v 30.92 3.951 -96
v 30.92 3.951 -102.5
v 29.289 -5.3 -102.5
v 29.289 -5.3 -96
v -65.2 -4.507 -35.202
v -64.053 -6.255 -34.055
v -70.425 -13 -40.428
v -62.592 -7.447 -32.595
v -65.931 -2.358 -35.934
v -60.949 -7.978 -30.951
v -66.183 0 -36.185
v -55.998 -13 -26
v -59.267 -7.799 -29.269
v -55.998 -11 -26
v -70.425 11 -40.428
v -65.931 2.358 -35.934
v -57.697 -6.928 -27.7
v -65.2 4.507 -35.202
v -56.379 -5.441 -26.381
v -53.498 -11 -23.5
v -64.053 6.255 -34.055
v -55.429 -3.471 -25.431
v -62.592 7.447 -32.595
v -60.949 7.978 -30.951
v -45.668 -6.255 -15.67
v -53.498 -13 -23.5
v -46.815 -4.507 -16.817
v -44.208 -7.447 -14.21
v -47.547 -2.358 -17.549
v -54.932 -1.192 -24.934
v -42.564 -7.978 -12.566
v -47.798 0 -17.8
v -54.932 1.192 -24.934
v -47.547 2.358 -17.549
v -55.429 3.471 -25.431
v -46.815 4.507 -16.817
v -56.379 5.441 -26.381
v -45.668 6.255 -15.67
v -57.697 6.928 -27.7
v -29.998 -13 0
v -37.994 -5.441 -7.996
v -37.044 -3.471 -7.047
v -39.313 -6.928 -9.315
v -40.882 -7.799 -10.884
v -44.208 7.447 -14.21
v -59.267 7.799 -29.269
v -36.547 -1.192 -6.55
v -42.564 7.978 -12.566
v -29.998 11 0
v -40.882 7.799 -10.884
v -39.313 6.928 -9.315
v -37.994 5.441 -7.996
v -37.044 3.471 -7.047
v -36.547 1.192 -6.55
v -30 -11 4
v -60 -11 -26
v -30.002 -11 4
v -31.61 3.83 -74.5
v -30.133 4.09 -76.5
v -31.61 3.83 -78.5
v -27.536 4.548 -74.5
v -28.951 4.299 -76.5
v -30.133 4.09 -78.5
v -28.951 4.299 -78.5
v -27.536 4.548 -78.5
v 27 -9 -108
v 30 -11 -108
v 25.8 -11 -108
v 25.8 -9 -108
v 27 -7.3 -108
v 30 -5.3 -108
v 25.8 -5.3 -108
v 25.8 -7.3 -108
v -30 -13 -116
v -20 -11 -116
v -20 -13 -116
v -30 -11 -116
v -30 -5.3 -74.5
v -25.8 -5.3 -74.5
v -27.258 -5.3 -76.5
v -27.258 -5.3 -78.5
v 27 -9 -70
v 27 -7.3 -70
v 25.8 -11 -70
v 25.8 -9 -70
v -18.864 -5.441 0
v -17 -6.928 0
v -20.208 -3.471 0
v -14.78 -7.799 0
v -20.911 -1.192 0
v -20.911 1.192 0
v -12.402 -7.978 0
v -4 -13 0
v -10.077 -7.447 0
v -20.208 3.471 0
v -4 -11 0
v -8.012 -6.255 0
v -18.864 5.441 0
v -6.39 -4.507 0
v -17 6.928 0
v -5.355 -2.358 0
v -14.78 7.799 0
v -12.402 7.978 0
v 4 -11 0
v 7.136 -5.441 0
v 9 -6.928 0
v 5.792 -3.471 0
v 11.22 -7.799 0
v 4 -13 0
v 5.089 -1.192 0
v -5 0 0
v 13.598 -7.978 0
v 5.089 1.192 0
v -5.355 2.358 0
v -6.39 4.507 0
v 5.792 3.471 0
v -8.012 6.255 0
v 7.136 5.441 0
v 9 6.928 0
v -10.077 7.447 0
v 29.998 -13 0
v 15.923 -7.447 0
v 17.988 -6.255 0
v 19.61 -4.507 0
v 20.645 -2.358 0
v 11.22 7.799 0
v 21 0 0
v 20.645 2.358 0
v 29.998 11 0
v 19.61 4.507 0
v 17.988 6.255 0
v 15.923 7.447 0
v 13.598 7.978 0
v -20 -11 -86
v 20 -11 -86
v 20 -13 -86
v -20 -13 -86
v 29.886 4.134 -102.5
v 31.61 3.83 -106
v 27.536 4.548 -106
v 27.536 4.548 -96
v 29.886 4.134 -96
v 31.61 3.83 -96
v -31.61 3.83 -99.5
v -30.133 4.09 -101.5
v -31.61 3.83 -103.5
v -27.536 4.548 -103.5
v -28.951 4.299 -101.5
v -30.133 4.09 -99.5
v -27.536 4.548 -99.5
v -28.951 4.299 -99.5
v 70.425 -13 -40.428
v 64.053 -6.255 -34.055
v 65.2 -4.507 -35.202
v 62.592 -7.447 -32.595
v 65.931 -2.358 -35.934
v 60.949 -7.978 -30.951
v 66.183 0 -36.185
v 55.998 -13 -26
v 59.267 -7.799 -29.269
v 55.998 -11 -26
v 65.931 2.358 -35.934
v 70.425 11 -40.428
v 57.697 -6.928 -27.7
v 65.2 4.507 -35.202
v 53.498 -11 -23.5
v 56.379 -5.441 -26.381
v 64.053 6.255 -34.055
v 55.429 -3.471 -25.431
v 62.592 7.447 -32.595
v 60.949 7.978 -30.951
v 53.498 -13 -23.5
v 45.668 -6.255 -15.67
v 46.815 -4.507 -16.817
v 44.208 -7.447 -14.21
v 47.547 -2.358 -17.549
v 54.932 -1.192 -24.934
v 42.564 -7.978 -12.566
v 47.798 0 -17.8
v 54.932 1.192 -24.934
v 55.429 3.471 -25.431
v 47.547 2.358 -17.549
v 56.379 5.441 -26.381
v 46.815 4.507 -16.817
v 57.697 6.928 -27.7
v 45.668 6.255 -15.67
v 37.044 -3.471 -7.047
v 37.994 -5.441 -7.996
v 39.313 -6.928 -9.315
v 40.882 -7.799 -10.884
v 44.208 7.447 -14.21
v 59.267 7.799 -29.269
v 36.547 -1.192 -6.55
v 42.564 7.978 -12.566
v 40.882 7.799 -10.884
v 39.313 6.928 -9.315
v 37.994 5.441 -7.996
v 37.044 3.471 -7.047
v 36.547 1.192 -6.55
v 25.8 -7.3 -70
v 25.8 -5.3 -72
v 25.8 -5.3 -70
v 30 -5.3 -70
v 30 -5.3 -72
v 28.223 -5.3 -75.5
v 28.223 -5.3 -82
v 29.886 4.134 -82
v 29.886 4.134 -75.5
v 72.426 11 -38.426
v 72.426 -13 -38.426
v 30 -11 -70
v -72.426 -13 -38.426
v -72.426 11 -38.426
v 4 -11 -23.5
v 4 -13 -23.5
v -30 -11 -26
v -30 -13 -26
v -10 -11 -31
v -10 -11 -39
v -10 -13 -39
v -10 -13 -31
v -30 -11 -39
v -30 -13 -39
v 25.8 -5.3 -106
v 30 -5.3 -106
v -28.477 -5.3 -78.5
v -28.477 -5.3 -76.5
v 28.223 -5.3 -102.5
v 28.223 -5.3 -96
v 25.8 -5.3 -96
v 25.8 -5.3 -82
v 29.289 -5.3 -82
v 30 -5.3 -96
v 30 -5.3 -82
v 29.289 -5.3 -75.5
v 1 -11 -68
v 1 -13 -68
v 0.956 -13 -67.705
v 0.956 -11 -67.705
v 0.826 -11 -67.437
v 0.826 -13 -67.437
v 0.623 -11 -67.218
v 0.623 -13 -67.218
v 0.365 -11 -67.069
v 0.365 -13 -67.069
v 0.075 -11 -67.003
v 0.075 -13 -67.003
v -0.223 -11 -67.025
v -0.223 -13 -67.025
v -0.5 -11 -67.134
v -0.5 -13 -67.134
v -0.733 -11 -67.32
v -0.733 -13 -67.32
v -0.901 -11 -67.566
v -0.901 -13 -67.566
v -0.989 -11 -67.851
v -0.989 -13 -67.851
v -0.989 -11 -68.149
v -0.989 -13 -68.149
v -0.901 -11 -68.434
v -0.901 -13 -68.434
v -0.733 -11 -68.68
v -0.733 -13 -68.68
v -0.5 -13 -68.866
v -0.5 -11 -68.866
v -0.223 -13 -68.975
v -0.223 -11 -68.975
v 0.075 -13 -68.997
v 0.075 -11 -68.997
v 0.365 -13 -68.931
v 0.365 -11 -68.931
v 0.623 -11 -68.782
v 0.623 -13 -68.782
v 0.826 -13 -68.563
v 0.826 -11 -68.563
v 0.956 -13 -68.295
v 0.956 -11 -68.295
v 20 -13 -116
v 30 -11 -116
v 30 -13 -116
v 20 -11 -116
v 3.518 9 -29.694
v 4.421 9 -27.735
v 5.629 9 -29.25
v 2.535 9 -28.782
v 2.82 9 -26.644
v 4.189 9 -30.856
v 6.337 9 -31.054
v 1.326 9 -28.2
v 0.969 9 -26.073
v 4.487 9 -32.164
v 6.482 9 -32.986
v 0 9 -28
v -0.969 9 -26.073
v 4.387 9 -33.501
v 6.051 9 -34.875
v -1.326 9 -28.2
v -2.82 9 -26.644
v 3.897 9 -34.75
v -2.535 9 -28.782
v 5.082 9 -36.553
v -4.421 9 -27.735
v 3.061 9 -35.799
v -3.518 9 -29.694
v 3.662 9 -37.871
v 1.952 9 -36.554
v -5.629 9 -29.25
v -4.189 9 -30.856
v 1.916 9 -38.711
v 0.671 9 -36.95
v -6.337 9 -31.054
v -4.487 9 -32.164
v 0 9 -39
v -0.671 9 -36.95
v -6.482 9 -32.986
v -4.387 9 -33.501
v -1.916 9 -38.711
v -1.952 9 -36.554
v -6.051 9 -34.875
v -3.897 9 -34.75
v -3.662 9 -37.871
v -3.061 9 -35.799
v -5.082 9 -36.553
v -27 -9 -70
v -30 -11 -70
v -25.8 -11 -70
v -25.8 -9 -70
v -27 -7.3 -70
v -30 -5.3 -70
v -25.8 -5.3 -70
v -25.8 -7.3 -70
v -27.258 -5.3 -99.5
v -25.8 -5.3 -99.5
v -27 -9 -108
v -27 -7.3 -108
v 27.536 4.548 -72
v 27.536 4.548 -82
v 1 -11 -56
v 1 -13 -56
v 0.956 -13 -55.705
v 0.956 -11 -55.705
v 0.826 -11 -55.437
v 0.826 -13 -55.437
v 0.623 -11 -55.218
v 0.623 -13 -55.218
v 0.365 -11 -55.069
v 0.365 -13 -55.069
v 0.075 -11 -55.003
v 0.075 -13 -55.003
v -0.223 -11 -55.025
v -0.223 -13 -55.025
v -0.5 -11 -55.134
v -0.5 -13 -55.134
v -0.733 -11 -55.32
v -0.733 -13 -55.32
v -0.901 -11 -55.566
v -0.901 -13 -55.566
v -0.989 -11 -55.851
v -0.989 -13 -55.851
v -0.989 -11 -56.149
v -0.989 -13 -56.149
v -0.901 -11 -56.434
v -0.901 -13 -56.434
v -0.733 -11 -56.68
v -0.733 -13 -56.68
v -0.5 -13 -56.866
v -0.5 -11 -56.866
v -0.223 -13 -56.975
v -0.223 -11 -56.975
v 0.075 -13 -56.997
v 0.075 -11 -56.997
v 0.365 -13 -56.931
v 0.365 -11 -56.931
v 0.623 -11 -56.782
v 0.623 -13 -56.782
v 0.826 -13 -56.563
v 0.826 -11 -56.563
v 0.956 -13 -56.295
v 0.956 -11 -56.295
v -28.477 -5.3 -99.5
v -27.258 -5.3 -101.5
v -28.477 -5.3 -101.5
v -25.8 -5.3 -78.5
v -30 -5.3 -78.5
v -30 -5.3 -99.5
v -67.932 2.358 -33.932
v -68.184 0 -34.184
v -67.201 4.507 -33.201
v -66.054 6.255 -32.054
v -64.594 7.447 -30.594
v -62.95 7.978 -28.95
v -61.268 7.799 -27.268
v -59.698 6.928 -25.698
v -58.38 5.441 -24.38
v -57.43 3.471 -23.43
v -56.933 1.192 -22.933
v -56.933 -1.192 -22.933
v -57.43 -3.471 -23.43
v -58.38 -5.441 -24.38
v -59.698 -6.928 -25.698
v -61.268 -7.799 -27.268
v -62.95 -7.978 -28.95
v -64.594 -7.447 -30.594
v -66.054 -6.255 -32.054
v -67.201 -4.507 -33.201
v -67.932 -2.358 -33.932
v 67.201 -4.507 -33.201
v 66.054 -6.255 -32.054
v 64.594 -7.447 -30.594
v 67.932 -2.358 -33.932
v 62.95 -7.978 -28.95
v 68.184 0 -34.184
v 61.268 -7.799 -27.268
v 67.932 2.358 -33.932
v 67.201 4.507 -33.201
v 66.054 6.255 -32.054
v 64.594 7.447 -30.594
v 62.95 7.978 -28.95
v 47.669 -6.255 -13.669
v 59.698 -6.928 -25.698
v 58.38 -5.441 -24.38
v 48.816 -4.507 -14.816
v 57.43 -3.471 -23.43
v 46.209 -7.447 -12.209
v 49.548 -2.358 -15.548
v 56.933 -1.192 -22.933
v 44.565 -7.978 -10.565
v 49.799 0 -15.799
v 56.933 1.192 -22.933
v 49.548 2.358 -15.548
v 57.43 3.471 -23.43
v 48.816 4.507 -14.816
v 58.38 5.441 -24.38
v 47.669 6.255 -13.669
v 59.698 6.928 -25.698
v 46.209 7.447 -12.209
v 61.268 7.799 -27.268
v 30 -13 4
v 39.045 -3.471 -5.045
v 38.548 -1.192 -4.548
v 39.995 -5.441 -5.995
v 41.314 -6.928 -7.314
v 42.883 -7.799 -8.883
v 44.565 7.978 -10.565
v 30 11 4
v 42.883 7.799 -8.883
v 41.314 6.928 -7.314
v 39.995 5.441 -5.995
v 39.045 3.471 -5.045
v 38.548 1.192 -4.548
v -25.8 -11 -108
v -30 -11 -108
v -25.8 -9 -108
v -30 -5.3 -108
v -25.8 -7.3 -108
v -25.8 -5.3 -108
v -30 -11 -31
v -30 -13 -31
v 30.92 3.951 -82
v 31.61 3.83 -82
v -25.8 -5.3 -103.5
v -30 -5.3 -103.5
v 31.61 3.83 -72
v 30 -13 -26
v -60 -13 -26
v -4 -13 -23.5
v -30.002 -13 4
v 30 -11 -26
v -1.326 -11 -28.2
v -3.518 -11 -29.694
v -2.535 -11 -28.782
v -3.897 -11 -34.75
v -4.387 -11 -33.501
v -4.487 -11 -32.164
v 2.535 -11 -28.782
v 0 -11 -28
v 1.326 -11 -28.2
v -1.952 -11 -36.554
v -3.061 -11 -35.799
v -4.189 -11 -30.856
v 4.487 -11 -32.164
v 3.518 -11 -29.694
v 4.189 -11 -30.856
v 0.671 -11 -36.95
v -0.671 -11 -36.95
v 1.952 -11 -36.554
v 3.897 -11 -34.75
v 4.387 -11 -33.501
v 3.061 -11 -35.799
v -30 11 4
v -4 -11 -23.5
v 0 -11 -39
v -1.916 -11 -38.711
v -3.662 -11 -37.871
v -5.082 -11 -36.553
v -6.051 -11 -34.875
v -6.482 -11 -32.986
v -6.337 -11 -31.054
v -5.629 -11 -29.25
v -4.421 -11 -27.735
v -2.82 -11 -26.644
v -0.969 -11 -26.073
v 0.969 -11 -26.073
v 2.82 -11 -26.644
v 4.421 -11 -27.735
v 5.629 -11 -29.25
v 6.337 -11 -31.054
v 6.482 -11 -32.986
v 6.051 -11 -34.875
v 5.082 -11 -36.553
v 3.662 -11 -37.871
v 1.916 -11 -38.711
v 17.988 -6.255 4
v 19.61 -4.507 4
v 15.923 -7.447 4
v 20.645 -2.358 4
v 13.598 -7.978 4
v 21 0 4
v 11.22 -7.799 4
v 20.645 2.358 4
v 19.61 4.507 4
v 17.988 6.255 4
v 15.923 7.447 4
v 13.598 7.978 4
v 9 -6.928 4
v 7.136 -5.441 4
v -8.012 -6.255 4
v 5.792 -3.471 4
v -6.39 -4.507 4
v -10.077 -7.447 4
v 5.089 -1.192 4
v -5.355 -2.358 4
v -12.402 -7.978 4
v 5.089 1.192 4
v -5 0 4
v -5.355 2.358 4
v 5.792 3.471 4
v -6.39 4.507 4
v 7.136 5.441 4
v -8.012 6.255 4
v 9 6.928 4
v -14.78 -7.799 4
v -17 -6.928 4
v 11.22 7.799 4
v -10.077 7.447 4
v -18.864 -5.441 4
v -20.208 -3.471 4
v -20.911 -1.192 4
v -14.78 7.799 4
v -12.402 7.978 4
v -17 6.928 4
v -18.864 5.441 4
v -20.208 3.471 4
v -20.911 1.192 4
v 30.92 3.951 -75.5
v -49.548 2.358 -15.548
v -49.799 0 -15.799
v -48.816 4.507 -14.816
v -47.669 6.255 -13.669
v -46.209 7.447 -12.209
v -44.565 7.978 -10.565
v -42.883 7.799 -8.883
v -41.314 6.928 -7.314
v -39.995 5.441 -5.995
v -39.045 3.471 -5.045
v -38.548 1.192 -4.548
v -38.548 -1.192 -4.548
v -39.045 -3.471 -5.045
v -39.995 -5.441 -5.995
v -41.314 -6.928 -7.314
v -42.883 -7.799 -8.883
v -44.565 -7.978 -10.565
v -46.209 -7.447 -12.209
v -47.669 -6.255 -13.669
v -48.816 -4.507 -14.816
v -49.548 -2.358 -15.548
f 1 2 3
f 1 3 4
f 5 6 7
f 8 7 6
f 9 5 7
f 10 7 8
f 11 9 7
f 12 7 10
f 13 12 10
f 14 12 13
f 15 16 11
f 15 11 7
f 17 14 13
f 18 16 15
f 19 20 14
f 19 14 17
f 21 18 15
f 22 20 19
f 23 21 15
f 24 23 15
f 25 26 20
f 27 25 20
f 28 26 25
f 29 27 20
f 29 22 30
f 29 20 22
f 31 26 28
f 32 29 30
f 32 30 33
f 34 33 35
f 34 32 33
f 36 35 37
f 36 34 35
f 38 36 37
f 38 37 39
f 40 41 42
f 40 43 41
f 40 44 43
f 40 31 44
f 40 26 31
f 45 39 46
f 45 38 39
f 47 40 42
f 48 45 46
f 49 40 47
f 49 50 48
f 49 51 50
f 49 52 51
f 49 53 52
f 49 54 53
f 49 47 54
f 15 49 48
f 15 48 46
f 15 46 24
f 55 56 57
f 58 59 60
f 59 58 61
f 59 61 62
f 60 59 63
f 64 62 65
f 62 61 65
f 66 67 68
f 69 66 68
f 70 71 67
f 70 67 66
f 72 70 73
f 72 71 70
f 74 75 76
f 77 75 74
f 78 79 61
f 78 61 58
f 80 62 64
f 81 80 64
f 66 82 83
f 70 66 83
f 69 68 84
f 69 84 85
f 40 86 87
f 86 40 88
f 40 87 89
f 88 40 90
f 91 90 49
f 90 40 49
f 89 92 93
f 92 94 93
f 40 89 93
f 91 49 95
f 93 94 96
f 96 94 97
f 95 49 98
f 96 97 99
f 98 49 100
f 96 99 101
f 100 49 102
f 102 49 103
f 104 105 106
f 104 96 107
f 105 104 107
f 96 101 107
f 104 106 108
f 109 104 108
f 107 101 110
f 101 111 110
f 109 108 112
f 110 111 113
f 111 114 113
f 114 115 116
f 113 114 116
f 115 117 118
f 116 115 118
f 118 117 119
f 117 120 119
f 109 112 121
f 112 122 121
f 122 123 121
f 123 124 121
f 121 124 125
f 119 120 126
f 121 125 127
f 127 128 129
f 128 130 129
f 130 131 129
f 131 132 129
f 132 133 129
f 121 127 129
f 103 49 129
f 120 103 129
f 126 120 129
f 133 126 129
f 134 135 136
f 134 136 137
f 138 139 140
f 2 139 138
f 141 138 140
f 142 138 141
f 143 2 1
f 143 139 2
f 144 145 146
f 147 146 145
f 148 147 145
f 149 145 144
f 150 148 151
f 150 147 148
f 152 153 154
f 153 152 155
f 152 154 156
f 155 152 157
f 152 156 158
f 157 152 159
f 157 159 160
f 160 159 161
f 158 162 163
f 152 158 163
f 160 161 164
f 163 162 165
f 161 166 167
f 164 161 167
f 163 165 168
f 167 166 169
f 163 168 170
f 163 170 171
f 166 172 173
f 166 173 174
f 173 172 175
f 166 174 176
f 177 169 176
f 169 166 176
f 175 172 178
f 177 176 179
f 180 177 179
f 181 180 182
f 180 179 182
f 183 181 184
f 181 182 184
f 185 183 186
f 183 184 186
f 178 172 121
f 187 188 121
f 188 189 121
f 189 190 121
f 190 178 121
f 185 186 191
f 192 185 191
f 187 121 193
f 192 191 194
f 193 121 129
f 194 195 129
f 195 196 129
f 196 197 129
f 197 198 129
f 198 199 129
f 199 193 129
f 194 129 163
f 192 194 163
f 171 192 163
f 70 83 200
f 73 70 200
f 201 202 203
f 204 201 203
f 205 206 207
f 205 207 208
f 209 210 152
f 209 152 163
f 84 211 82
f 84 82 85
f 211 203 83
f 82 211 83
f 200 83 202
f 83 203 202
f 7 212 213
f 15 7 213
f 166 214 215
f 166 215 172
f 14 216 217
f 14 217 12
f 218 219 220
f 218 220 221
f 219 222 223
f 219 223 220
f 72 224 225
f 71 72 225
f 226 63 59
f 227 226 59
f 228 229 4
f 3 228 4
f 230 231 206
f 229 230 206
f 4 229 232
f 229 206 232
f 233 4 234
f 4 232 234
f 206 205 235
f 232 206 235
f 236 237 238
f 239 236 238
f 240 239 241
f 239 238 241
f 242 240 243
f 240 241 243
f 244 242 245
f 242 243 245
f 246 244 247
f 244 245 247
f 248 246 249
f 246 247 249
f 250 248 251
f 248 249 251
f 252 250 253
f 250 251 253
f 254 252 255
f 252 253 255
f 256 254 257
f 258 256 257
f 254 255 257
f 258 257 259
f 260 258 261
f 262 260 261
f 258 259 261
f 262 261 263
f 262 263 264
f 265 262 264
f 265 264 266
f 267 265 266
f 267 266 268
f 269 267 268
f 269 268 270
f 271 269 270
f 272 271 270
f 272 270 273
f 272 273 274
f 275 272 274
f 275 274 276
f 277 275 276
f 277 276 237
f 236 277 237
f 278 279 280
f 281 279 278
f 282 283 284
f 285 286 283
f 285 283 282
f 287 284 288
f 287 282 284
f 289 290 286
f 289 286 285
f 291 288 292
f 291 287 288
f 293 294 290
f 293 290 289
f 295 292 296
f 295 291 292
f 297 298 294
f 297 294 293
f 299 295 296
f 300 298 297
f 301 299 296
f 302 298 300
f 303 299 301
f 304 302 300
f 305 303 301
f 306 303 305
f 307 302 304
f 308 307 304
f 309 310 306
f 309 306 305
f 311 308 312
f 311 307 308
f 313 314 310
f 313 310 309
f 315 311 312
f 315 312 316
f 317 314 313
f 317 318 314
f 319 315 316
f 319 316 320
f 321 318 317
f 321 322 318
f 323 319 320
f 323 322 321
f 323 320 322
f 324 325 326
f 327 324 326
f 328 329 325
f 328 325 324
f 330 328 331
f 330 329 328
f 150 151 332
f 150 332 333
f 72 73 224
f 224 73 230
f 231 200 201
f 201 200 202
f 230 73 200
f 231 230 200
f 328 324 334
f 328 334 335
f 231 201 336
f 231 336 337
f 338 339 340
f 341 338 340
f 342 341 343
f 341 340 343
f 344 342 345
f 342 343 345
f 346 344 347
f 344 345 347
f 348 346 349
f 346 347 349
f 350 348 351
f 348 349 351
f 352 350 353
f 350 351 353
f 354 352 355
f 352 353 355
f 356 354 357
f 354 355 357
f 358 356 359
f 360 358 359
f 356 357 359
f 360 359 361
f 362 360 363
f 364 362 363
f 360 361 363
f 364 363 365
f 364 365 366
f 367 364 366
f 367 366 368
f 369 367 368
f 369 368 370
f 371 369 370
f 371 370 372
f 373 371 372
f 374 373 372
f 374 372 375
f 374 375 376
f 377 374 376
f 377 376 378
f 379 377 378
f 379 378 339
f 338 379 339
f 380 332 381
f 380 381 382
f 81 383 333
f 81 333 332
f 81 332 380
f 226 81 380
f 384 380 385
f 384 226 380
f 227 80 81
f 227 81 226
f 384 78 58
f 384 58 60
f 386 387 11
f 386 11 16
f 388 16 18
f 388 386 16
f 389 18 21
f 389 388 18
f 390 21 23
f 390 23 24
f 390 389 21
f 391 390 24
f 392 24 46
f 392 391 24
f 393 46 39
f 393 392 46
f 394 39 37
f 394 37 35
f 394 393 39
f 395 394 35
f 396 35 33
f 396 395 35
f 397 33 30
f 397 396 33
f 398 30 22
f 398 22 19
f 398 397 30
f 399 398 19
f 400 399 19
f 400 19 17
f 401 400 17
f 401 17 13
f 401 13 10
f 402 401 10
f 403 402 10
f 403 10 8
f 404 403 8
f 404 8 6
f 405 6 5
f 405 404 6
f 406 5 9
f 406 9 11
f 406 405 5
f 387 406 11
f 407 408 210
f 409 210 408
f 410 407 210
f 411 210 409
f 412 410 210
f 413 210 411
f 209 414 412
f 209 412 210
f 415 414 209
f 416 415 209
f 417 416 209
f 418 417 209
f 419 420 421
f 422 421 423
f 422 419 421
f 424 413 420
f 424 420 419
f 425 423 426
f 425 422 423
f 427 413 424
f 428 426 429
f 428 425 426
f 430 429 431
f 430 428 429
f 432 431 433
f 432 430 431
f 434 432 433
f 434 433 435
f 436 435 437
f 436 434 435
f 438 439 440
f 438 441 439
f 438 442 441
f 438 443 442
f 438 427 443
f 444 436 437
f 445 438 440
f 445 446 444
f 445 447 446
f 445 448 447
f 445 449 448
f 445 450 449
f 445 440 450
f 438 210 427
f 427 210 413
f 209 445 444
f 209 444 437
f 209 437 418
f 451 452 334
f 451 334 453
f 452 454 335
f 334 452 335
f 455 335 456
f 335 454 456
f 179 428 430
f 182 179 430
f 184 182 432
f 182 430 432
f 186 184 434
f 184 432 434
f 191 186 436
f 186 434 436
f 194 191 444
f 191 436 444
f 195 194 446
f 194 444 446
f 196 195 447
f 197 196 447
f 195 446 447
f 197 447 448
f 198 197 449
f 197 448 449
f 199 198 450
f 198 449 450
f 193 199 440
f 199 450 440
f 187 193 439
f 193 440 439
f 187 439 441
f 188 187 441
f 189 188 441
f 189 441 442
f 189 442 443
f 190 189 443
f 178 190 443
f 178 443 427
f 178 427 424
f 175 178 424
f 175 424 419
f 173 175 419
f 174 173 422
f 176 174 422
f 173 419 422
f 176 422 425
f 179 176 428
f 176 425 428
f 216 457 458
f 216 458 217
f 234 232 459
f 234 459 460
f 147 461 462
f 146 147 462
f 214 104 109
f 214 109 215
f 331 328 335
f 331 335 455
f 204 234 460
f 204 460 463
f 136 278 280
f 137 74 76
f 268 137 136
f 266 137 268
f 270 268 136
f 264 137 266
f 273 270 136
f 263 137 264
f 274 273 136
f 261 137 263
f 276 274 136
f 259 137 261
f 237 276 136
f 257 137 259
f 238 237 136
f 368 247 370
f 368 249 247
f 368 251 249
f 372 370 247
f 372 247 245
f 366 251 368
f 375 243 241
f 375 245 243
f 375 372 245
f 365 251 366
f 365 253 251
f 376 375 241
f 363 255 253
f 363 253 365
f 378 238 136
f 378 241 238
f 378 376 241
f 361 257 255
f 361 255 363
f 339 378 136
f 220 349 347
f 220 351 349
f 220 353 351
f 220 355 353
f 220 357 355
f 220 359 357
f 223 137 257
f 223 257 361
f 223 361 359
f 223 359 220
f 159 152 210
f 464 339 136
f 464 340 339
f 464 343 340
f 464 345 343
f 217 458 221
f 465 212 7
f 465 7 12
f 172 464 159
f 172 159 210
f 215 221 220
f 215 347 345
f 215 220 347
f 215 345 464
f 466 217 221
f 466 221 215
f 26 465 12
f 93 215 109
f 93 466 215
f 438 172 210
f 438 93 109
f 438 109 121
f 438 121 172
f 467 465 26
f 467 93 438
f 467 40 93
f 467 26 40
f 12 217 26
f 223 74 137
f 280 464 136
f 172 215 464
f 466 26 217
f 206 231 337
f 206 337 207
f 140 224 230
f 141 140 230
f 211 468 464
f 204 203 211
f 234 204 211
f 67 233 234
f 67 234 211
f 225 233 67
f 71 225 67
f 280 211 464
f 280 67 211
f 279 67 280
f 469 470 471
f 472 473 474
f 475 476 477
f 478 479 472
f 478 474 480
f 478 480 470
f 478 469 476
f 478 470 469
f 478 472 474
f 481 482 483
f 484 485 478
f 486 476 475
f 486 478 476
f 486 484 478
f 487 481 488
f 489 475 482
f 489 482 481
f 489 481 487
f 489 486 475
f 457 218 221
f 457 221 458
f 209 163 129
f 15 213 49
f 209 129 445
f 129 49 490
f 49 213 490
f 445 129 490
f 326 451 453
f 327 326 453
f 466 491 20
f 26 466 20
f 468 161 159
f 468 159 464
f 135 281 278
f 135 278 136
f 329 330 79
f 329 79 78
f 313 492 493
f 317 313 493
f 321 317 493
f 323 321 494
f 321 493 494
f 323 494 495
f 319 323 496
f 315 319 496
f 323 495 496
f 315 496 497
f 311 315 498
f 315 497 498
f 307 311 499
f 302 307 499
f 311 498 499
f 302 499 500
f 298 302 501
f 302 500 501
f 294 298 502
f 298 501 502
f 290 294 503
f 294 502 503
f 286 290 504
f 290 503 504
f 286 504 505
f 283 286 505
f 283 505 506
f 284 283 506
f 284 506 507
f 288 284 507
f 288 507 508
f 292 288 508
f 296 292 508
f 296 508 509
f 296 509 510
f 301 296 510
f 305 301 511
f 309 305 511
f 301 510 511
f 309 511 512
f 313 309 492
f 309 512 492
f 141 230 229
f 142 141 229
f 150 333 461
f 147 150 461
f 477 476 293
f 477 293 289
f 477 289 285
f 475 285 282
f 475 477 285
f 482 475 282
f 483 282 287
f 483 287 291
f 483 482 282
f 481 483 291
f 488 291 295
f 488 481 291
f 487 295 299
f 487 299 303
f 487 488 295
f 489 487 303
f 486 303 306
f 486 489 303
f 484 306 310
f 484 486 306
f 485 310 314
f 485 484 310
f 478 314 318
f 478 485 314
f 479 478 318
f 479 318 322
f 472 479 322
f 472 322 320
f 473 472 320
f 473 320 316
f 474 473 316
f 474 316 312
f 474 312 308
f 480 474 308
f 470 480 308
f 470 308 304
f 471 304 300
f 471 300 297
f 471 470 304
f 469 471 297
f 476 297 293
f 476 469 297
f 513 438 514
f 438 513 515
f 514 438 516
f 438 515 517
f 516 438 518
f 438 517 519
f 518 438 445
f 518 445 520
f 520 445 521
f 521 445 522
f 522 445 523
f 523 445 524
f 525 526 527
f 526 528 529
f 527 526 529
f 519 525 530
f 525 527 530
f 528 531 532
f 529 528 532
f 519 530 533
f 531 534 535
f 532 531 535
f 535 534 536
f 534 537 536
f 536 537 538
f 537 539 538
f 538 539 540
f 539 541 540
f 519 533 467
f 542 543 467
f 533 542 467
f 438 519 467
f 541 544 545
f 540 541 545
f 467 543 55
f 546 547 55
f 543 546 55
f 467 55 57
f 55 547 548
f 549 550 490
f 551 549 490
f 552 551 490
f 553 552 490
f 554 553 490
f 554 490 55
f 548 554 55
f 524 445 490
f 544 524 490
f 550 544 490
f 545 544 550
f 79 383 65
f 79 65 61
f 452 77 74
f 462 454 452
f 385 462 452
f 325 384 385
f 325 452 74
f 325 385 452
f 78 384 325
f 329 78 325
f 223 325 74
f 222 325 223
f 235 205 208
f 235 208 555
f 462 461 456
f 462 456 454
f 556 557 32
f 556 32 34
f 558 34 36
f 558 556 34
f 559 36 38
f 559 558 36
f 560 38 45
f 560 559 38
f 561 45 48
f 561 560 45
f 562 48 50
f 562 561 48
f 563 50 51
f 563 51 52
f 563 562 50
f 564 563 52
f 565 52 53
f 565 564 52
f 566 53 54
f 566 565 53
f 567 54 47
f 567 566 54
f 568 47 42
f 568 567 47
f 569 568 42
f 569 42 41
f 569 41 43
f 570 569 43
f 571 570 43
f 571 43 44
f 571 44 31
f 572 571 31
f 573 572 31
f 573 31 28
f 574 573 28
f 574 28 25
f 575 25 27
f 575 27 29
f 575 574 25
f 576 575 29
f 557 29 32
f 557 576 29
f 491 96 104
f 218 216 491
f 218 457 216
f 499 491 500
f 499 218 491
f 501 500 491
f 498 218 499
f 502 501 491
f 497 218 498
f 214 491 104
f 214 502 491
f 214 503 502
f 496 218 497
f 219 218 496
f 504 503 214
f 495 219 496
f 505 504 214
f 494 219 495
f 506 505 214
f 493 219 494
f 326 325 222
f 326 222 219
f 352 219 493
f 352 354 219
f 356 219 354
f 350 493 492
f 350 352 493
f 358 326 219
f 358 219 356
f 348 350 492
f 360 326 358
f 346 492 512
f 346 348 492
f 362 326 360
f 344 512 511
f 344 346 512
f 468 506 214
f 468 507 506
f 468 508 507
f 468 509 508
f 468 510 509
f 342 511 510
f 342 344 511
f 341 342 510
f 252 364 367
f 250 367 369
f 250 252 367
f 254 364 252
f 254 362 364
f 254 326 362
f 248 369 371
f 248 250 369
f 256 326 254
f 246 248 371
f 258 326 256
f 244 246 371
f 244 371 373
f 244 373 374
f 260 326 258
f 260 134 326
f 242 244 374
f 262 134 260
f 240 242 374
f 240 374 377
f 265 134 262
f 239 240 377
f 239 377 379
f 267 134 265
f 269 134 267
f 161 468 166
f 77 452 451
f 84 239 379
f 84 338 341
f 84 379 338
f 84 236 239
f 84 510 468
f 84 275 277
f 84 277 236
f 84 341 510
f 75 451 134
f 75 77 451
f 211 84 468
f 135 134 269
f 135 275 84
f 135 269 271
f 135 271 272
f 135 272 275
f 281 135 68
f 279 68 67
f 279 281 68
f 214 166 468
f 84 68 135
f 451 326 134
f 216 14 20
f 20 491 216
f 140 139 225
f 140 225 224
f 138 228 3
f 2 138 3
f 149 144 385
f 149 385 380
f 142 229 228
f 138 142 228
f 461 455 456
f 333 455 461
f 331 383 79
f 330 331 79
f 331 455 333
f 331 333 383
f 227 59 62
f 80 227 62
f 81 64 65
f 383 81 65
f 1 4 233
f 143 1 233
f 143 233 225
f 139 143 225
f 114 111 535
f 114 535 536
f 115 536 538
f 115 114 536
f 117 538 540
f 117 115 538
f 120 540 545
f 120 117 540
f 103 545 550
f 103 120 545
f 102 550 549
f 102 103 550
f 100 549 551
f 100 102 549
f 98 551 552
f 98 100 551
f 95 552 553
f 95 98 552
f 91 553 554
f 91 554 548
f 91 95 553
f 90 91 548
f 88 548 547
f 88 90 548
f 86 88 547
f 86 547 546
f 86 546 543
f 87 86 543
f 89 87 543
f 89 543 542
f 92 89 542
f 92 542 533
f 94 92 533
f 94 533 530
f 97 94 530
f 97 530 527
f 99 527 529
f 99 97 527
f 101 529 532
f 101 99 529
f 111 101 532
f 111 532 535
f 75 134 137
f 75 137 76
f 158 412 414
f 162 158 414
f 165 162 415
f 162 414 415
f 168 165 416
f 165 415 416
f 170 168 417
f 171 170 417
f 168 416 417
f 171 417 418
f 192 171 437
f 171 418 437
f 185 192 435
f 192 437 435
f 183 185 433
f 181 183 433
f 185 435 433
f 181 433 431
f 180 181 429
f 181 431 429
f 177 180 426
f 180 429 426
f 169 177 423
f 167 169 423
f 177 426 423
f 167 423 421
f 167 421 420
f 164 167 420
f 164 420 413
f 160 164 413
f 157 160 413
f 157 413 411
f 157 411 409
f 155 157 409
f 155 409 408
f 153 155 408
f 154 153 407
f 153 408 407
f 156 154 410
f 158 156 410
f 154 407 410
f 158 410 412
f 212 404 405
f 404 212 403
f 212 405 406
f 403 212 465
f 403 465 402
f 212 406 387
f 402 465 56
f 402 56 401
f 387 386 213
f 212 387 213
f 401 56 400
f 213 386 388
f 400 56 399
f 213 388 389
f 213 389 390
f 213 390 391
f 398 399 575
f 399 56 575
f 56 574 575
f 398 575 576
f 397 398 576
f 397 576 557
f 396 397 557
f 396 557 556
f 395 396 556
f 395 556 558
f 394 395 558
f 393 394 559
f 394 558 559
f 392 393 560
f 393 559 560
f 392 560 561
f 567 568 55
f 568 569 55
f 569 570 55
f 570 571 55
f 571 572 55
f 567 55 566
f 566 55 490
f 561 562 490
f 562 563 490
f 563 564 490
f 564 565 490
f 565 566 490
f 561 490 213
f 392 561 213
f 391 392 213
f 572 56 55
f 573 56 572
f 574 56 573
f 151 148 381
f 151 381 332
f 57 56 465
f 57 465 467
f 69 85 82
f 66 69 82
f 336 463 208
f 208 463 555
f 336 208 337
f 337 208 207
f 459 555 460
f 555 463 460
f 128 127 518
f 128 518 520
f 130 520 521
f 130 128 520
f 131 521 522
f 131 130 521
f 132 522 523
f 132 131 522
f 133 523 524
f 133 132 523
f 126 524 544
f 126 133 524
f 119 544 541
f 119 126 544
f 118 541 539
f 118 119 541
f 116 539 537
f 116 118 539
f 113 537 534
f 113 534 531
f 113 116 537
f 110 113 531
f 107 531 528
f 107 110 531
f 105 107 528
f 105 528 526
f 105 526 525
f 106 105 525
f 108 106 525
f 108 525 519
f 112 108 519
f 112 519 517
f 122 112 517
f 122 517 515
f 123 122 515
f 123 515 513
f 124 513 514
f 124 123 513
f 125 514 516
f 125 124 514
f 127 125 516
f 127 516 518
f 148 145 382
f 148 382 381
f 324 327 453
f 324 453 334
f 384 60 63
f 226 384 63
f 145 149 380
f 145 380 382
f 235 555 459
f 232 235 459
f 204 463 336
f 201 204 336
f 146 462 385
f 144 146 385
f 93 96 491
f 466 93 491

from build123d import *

# Parameters (mm, degrees)
SKETCH1_W           = 60
SKETCH1_H           = 22
SKETCH1_R           = 8
BOSS_EXTRUDE1_DEPTH = 4
BOSS_EXTRUDE2_DEPTH = 2
BOSS_EXTRUDE3_START = -70
BOSS_EXTRUDE3_DEPTH = 38
BOSS_EXTRUDE5_DEPTH = 10
BOSS_EXTRUDE6_DEPTH = 10
SKETCH10_R          = 1
CUT_EXTRUDE1_DEPTH  = 4
SKETCH12_W          = 24
SKETCH12_H          = 60
SKETCH12_R          = 8
BOSS_EXTRUDE7_DEPTH = 2.83
SKETCH13_R          = 6.5
SKETCH13_R_2        = 4.5
BOSS_EXTRUDE8_DEPTH = 20


with BuildPart() as part:
    # Sketch1 → Boss-Extrude1 (new body)
    with BuildSketch(Plane.XY):
        Rectangle(SKETCH1_W, SKETCH1_H)
        with Locations((-13, 0)):
            Circle(SKETCH1_R, mode=Mode.SUBTRACT)
        with Locations((13, 0)):
            Circle(SKETCH1_R, mode=Mode.SUBTRACT)
    extrude(amount=BOSS_EXTRUDE1_DEPTH)

    # Sketch2 → Boss-Extrude2 (add)
    with BuildSketch(Plane(origin=(0, -11, 0), x_dir=(-1, 0, 0), z_dir=(0, -1, 0))):
        Polygon((-30, 116), (-20, 116), (-20, 86), (20, 86), (20, 116), (30, 116), (30, 39), (10, 39), (10, 31), (30, 31), (30, 26), (60, 26), (30.002383175, -4), (30, -4), (-30, -4), (-60, 26), (-30, 26), align=None)
        Polygon((-53.5, 23.5), (-30, 0), (-4, 0), (-4, 23.5), align=None, mode=Mode.SUBTRACT)
        Polygon((53.49813318, 23.5), (30, 0), (4, 0), (4, 23.5), align=None, mode=Mode.SUBTRACT)
    extrude(amount=BOSS_EXTRUDE2_DEPTH)

    # Sketch4 → Boss-Extrude3 (add)
    with BuildSketch(Plane.XY.offset(BOSS_EXTRUDE3_START)):
        Polygon((-25.8, -11), (-25.8, -9), (-27, -9), (-27, -7.3), (-25.8, -7.3), (-25.8, -5.3), (-30, -5.3), (-30, -11), align=None)
        Polygon((30, -5.3), (30, -11), (25.8, -11), (25.8, -9), (27, -9), (27, -7.3), (25.8, -7.3), (25.8, -5.3), align=None)
    extrude(amount=-BOSS_EXTRUDE3_DEPTH)

    # Sketch7 → Boss-Extrude5 (add)
    with BuildSketch(Plane(origin=(0.128388188, -0.728125596, 0), x_dir=(0, 0, 1), z_dir=(-0.17364817766693402, 0.9848077530122075, 0))):
        Polygon((-74.5, -26.328375369), (-74.5, -30.464567932), (-78.5, -30.464567932), (-78.5, -28.964567932), (-76.5, -28.964567932), (-76.5, -27.764567932), (-78.5, -27.764567932), (-78.5, -26.328375369), align=None)
        Polygon((-101.5, -27.764567932), (-99.5, -27.764567932), (-99.5, -26.328375369), (-103.5, -26.328375369), (-103.5, -30.464567932), (-99.5, -30.464567932), (-99.5, -28.964567932), (-101.5, -28.964567932), align=None)
    extrude(amount=BOSS_EXTRUDE5_DEPTH)

    # Sketch8 → Boss-Extrude6 (add)
    with BuildSketch(Plane(origin=(-0.128388188, -0.728125596, 0), x_dir=(0, 0, 1), z_dir=(0.17364817766692736, 0.9848077530122086, 0))):
        Polygon((-82, 26.328375369), (-82, 28.714567932), (-75.5, 28.714567932), (-75.5, 29.764567932), (-82, 29.764567932), (-82, 30.464567932), (-72, 30.464567932), (-72, 26.328375369), align=None)
        Polygon((-96, 29.764567932), (-96, 30.464567932), (-106, 30.464567932), (-106, 26.328375369), (-96, 26.328375369), (-96, 28.714567932), (-102.5, 28.714567932), (-102.5, 29.764567932), align=None)
    extrude(amount=BOSS_EXTRUDE6_DEPTH)

    # Sketch10 → Cut-Extrude1 (cut)
    with BuildSketch(Plane.XZ.offset(13)):
        with Locations((0, -56)):
            Circle(SKETCH10_R)
        with Locations((0, -68)):
            Circle(SKETCH10_R)
    extrude(amount=-CUT_EXTRUDE1_DEPTH, mode=Mode.SUBTRACT)

    # Sketch12 → Boss-Extrude7 (add)
    with BuildSketch(Plane(origin=(17, 0, 17), x_dir=(0, 1, 0), z_dir=(0.7071067811865561, 0, 0.7071067811865389))):
        with Locations((-1, -48.384776311)):
            Rectangle(SKETCH12_W, SKETCH12_H)
        with Locations((0, -38.384776311)):
            Circle(SKETCH12_R, mode=Mode.SUBTRACT)
        with Locations((0, -64.384776311)):
            Circle(SKETCH12_R, mode=Mode.SUBTRACT)
    boss_extrude7 = extrude(amount=-BOSS_EXTRUDE7_DEPTH)

    # Mirror2: Boss-Extrude7 across plane
    add(boss_extrude7.mirror(Plane(origin=(0, 0, 0), x_dir=(0, 0, 1), z_dir=(1, 0, 0))))

    # Sketch13 → Boss-Extrude8 (add)
    with BuildSketch(Plane(origin=(0, -11, 0), x_dir=(1, 0, 0), z_dir=(0, 1, 0))):
        with Locations((0, 32.5)):
            Circle(SKETCH13_R)
        with Locations((0, 32.5)):
            Circle(SKETCH13_R_2, mode=Mode.SUBTRACT)
    extrude(amount=BOSS_EXTRUDE8_DEPTH)


solid = part.part
